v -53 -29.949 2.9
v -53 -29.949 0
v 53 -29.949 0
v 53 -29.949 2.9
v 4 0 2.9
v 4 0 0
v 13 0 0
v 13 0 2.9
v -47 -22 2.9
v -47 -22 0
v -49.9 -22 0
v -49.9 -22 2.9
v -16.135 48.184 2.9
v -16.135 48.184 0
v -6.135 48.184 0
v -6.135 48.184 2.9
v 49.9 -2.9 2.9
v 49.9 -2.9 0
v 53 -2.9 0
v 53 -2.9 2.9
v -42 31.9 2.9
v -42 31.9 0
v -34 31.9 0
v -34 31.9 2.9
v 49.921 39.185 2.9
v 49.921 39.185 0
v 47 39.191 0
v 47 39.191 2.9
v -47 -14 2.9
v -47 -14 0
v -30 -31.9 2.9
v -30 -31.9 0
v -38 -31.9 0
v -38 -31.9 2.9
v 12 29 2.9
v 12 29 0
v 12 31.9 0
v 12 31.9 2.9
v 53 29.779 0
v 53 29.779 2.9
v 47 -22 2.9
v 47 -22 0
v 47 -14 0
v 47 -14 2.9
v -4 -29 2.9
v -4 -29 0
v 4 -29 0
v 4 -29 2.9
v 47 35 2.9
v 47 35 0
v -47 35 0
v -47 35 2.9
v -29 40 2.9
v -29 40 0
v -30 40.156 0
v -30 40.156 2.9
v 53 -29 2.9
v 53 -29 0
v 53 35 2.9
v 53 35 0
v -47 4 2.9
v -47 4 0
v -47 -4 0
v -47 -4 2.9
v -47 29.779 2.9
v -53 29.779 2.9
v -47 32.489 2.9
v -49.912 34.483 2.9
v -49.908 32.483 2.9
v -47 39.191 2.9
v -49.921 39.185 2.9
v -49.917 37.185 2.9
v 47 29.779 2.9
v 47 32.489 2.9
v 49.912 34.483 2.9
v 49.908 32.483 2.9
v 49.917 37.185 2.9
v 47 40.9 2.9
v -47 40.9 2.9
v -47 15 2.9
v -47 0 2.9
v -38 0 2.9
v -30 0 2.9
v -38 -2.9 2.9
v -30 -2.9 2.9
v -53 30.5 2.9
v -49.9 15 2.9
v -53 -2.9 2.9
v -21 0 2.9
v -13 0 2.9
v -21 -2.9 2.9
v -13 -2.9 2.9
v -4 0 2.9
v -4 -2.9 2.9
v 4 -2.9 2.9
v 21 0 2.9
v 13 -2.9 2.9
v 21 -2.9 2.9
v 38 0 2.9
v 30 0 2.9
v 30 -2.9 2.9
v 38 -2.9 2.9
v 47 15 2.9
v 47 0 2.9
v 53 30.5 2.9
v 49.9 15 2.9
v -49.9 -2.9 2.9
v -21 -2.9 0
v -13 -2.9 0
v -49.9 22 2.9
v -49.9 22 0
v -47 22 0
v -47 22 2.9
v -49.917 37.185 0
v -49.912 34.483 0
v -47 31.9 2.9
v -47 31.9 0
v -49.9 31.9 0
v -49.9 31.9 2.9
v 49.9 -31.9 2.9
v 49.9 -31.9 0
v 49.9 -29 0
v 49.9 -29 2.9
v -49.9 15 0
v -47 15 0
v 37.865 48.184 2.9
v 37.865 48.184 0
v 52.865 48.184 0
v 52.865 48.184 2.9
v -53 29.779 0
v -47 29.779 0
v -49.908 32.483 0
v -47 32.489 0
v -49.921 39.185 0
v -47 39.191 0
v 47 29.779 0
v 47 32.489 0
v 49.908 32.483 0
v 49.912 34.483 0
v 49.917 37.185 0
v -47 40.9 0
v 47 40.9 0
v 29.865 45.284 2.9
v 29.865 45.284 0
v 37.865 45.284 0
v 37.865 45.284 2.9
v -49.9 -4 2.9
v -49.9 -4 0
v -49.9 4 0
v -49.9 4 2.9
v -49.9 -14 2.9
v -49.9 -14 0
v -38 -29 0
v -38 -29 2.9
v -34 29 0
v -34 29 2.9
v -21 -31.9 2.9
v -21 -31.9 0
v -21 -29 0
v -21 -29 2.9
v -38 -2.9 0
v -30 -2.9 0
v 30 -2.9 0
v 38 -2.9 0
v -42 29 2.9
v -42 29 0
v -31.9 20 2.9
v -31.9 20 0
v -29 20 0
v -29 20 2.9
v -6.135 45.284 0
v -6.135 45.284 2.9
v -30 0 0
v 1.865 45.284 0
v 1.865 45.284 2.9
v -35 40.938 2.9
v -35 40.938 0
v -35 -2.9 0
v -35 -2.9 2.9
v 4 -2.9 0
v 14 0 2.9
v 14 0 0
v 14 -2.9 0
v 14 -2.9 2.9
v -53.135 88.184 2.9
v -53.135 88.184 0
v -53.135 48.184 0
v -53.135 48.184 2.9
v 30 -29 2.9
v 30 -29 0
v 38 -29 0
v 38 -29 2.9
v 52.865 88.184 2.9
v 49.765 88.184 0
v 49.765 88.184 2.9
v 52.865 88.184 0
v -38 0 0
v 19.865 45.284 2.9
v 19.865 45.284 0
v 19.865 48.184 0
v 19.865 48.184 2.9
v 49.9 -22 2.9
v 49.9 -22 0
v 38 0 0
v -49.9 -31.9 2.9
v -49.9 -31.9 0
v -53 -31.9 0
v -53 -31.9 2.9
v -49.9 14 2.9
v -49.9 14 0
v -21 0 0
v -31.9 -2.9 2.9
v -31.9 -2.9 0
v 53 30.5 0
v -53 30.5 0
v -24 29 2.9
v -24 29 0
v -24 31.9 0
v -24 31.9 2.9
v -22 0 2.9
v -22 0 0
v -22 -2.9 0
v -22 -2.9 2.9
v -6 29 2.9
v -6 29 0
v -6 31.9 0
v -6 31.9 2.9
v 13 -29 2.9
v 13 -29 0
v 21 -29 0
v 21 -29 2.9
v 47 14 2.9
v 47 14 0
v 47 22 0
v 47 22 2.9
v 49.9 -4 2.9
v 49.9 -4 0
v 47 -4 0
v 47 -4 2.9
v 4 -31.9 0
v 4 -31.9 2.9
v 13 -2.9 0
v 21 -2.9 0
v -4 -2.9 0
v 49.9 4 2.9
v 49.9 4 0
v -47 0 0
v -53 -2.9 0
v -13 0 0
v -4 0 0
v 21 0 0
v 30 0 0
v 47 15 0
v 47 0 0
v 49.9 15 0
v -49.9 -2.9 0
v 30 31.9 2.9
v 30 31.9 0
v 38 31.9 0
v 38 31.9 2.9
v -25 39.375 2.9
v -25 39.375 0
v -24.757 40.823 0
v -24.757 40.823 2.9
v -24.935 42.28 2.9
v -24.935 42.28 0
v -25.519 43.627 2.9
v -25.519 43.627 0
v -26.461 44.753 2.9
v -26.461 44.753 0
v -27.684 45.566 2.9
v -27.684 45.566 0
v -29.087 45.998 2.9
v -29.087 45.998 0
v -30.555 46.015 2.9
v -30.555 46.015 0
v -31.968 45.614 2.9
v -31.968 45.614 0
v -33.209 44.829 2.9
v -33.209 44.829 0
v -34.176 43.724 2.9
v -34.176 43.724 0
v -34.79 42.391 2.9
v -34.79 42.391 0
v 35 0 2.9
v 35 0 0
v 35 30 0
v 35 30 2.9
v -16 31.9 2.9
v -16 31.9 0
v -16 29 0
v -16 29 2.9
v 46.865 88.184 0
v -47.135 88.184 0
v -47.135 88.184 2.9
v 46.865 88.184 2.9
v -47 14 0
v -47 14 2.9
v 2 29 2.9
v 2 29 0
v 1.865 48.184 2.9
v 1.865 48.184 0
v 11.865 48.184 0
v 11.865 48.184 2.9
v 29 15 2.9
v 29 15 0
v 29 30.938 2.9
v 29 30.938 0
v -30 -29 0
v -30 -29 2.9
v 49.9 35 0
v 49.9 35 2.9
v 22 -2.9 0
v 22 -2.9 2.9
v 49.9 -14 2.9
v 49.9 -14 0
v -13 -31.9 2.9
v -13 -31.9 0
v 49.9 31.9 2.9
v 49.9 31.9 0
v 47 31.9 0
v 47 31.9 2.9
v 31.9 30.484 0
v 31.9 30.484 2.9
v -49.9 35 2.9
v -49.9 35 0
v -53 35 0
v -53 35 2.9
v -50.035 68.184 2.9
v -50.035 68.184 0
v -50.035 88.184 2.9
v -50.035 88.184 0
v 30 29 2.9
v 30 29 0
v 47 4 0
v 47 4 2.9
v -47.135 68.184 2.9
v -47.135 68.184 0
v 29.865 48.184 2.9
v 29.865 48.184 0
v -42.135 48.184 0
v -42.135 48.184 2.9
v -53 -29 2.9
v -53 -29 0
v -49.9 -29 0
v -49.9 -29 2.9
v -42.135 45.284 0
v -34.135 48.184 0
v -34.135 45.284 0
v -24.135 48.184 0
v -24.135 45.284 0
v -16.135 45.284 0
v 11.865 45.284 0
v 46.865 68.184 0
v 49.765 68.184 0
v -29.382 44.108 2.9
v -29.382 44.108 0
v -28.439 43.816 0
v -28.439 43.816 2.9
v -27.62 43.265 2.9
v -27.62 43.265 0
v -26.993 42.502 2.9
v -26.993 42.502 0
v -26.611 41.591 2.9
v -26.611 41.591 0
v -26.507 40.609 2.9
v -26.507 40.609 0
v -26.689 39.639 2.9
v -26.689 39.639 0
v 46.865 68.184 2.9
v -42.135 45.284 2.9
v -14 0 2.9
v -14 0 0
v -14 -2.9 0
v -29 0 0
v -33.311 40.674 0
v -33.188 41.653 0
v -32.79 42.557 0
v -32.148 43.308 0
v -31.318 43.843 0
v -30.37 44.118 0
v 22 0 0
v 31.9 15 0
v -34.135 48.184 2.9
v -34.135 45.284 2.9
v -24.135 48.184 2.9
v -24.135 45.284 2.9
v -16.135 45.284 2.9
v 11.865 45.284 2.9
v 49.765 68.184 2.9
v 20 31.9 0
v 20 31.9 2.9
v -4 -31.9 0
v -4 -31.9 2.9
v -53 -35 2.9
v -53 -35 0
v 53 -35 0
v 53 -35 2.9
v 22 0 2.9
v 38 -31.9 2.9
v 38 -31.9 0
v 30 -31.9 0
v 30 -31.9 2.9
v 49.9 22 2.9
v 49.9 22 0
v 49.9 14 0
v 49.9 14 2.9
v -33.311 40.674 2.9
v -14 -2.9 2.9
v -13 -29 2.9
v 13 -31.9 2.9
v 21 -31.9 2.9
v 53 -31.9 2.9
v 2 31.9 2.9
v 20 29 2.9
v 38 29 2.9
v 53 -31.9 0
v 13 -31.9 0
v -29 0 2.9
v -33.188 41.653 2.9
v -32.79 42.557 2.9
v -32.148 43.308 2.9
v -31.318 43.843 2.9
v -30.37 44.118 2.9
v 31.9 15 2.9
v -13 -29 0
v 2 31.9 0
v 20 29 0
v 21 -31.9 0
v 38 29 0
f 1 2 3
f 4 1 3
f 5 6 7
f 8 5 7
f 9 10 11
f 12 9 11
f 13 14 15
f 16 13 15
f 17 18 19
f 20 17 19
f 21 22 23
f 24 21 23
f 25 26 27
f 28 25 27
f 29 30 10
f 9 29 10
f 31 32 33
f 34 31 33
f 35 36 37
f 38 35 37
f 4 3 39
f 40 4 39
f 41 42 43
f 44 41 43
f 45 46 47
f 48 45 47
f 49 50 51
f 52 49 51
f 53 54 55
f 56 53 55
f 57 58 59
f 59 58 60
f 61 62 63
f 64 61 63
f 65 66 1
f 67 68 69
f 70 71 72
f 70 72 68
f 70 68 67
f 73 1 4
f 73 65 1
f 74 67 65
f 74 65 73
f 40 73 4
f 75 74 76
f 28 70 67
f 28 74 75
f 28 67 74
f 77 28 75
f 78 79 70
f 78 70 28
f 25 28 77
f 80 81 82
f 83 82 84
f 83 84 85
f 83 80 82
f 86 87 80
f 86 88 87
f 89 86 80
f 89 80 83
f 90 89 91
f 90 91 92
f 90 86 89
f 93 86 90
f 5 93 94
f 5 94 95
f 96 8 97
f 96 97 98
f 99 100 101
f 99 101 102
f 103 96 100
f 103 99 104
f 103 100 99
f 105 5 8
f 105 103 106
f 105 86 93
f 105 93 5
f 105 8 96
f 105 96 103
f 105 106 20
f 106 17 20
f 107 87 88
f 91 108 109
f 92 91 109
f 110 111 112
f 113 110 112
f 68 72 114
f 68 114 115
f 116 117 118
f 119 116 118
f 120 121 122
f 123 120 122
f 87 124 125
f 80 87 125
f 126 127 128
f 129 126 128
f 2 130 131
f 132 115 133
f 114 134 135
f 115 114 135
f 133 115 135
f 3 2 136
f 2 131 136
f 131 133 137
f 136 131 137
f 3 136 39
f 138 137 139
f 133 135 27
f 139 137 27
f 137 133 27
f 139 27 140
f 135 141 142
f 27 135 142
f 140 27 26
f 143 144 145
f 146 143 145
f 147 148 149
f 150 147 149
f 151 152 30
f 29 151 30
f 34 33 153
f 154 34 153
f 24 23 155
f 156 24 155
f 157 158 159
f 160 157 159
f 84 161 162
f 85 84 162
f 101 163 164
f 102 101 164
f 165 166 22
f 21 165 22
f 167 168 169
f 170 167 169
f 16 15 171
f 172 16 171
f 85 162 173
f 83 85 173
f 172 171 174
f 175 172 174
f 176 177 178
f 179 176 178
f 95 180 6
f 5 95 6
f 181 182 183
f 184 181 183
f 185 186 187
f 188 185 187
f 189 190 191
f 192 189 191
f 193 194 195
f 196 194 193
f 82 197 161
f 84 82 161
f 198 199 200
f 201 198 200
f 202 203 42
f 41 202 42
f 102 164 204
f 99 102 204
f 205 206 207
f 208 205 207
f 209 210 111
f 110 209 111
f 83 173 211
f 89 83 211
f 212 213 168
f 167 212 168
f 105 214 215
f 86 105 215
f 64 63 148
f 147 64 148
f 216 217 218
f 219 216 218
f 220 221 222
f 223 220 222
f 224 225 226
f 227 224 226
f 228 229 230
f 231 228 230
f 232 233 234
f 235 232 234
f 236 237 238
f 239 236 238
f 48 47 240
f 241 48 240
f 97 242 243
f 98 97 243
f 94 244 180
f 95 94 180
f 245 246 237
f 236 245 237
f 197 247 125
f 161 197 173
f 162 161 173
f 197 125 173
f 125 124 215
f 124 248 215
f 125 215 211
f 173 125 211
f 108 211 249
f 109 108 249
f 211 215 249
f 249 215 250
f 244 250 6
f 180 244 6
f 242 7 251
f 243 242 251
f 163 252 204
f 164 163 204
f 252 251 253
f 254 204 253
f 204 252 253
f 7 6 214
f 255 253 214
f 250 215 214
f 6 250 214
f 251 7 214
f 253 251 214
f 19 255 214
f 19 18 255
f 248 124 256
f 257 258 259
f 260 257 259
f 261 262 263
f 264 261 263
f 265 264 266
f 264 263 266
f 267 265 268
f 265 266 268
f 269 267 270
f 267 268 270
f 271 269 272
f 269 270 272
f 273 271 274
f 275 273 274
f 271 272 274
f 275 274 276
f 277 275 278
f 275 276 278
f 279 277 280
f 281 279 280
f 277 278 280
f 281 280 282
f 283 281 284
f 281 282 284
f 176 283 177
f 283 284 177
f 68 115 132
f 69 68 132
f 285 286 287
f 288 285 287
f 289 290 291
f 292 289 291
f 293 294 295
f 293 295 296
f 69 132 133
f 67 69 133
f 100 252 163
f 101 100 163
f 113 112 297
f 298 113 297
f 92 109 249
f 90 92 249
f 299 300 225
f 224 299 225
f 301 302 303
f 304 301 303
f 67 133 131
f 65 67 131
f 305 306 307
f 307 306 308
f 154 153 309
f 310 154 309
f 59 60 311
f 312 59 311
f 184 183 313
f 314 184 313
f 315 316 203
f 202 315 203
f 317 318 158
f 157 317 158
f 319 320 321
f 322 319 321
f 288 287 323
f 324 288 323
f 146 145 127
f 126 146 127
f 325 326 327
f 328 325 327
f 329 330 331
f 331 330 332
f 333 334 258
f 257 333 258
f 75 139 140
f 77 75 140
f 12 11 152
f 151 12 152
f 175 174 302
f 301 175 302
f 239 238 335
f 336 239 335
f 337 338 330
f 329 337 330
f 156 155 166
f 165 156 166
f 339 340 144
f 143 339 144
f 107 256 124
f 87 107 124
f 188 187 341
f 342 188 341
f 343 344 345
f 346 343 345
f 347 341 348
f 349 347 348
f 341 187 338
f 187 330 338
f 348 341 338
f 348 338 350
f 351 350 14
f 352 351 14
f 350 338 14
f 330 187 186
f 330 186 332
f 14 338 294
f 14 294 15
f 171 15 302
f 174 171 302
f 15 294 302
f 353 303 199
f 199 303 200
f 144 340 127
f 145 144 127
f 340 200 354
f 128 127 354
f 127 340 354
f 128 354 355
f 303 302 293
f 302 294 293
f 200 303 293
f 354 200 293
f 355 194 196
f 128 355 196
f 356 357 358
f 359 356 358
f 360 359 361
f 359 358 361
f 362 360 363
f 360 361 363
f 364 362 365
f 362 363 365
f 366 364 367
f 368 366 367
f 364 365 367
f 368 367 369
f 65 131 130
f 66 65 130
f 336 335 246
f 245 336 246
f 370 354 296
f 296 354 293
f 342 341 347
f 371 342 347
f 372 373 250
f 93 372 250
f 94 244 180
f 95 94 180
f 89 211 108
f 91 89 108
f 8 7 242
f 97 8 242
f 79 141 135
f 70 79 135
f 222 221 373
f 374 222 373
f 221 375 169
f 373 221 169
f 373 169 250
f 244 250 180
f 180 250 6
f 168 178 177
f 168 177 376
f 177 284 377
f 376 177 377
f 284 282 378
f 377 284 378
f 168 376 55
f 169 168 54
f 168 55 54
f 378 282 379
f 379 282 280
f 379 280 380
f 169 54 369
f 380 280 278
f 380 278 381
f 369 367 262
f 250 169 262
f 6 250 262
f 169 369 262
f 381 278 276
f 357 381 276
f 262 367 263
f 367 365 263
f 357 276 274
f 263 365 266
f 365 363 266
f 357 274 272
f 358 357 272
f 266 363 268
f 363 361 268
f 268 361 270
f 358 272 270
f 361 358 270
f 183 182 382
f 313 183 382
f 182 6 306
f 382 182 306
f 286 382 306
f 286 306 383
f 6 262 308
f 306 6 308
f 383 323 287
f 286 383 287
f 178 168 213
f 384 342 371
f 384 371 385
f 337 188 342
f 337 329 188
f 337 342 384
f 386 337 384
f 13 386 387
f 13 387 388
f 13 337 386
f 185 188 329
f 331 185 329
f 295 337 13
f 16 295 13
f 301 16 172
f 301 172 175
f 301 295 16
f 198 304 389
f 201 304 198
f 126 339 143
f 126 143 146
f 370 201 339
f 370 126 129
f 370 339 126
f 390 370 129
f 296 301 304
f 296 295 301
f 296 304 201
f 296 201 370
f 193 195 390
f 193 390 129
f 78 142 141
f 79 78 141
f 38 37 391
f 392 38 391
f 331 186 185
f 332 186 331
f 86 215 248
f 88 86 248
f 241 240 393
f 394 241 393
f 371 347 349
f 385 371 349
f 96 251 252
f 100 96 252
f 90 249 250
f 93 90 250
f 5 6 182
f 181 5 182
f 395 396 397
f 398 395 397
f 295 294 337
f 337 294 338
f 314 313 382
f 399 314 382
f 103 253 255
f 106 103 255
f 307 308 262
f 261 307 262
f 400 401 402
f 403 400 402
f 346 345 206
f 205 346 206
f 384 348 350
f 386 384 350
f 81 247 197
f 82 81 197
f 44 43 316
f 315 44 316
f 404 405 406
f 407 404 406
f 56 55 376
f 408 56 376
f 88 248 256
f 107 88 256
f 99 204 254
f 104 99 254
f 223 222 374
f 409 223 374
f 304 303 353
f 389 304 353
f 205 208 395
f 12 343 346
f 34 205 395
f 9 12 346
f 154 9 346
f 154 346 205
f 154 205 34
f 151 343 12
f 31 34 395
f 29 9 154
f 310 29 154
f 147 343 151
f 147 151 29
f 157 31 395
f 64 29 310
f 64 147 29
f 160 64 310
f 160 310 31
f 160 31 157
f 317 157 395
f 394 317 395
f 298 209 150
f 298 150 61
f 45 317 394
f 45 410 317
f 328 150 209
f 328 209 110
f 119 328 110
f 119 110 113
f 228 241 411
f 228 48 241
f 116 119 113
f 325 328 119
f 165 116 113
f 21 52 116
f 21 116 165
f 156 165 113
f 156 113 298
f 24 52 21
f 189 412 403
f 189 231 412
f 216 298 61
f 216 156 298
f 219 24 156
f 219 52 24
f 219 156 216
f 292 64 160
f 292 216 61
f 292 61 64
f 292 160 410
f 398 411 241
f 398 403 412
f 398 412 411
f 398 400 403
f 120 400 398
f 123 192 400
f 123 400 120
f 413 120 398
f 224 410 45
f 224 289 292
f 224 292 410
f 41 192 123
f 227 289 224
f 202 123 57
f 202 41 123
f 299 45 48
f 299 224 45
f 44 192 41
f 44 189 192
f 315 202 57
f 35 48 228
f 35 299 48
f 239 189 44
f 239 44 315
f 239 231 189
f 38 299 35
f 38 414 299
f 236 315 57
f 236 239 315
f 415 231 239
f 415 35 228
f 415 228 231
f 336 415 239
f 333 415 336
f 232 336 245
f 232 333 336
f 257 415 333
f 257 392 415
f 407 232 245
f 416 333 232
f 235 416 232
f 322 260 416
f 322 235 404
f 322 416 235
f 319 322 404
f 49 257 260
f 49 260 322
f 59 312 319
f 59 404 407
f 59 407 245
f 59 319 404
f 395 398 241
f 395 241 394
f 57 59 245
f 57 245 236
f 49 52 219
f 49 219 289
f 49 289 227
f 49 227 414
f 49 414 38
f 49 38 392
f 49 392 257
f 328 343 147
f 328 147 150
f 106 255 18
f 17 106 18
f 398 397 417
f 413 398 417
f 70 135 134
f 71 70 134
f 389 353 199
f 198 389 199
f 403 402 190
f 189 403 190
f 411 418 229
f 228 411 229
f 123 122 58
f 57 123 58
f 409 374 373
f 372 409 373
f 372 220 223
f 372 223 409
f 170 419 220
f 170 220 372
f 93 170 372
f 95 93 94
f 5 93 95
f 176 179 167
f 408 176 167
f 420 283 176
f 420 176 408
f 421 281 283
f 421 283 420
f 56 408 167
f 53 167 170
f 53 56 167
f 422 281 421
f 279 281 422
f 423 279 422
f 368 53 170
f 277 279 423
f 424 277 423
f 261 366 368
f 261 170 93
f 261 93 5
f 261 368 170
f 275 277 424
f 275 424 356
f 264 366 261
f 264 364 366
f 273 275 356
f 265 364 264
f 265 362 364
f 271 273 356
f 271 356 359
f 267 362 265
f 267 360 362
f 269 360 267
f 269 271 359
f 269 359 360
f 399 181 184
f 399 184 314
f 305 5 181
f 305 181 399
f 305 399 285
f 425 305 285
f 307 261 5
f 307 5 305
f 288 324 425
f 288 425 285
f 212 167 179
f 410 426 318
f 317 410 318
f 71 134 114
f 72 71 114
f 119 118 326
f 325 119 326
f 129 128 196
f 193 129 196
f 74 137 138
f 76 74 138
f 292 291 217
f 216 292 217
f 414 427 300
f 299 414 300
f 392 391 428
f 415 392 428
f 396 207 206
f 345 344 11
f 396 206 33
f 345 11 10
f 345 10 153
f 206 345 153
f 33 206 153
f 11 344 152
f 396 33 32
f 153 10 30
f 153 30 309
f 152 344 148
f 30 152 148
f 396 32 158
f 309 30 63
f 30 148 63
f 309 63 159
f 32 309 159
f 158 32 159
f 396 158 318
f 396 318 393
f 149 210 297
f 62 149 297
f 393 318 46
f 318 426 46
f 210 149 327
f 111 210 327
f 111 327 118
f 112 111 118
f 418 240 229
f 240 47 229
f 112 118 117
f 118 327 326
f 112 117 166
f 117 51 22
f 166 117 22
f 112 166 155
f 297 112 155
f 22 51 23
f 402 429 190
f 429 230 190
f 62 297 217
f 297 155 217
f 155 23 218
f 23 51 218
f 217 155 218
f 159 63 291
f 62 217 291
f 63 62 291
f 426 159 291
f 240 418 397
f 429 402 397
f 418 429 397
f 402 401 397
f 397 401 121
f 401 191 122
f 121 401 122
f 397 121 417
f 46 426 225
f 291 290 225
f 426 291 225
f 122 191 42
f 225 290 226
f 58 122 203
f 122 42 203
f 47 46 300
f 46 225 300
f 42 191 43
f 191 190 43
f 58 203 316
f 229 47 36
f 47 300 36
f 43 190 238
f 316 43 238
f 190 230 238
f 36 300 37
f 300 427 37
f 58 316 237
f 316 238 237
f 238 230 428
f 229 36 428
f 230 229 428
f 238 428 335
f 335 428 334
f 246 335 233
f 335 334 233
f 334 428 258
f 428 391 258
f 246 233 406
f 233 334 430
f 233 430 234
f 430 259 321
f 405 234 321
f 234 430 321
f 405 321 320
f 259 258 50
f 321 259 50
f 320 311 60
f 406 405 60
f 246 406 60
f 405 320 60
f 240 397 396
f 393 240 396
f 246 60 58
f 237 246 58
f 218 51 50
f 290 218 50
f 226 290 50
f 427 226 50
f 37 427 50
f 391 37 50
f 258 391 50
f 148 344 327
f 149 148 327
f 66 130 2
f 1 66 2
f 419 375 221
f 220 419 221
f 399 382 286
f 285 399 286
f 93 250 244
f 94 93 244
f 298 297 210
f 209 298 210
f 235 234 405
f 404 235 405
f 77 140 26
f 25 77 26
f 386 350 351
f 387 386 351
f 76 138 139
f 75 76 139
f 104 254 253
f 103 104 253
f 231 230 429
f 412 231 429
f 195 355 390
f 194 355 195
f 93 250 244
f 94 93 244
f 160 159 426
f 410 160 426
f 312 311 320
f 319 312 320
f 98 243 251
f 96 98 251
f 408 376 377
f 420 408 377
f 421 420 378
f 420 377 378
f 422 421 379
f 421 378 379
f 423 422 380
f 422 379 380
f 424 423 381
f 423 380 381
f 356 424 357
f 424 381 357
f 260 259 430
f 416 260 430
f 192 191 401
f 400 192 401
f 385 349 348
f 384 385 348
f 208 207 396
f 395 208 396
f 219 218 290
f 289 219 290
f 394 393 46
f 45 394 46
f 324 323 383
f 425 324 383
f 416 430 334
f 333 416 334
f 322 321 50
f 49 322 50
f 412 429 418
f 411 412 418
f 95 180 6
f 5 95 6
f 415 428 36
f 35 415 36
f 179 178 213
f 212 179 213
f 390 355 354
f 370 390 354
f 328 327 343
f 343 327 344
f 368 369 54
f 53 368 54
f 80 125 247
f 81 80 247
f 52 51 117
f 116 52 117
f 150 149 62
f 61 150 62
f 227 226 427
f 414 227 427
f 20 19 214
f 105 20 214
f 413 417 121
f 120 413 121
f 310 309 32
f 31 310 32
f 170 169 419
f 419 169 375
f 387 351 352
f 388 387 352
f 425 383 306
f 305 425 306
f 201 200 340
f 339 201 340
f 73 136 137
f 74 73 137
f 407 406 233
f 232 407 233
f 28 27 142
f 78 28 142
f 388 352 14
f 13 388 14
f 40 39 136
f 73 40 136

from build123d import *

# Parameters (mm, degrees)
F2_DEPTH  = 2.9
F3_W      = 94
F3_H      = 16
F3_H_2    = 4
F3_W_2    = 3.1
F3_H_3    = 20
F4_DEPTH  = 2.9
F6_DEPTH  = 2.9
F8_DEPTH  = 2.9
F9_W      = 94
F9_H      = 1
F10_DEPTH = 2.9


# Not quite as in the source:
# - ends of sketch curves that miss each other by under 0.0002 mm in the source are joined


with BuildPart() as f2:
    # F1 (on Top) → F2 (new body)
    with BuildSketch(Plane.XY):
        Polygon((-53, -31.9), (-53, -35), (53, -35), (53, -31.9), (49.9, -31.9), (49.9, -29), (53, -29), (53, 35), (49.9, 35), (49.9, 31.9), (47, 31.9), (47, 35), (-47, 35), (-47, 31.9), (-49.9, 31.9), (-49.9, 35), (-53, 35), (-53, -29), (-49.9, -29), (-49.9, -31.9), align=None)
        Polygon((38, 29), (47, 29), (47, 22), (49.9, 22), (49.9, 14), (47, 14), (47, 4), (49.9, 4), (49.9, -4), (47, -4), (47, -14), (49.9, -14), (49.9, -22), (47, -22), (47, -29), (38, -29), (38, -31.9), (30, -31.9), (30, -29), (21, -29), (21, -31.9), (13, -31.9), (13, -29), (4, -29), (4, -31.9), (-4, -31.9), (-4, -29), (-13, -29), (-13, -31.9), (-21, -31.9), (-21, -29), (-30, -29), (-30, -31.9), (-38, -31.9), (-38, -29), (-47, -29), (-47, -22), (-49.9, -22), (-49.9, -14), (-47, -14), (-47, -4), (-49.9, -4), (-49.9, 4), (-47, 4), (-47, 14), (-49.9, 14), (-49.9, 22), (-47, 22), (-47, 29), (-42, 29), (-42, 31.9), (-34, 31.9), (-34, 29), (-24, 29), (-24, 31.9), (-16, 31.9), (-16, 29), (-6, 29), (-6, 31.9), (2, 31.9), (2, 29), (12, 29), (12, 31.9), (20, 31.9), (20, 29), (30, 29), (30, 31.9), (38, 31.9), align=None, mode=Mode.SUBTRACT)
        Polygon((47, -29), (0, 0), (-47, -29), (-38, -29), (-30, -29), (-21, -29), (-13, -29), (-4, -29), (4, -29), (13, -29), (21, -29), (30, -29), (38, -29), align=None)
        Polygon((-47, -29), (0, 0), (-47, 29), (-47, 22), (-47, 14), (-47, 4), (-47, -4), (-47, -14), (-47, -22), align=None)
        Polygon((0, 0), (47, 29), (38, 29), (30, 29), (20, 29), (12, 29), (2, 29), (-6, 29), (-16, 29), (-24, 29), (-34, 29), (-42, 29), (-47, 29), align=None)
        Polygon((47, 22), (47, 29), (0, 0), (47, -29), (47, -22), (47, -14), (47, -4), (47, 4), (47, 14), align=None)
    extrude(amount=F2_DEPTH)


with BuildPart() as f4:
    # F3 (on Top) → F4 (new body)
    with BuildSketch(Plane.XY):
        with Locations((-0.1350676175, 76.1836106628)):
            Rectangle(F3_W, F3_H)
        with Locations((-0.1350676175, 86.1836106628)):
            Rectangle(F3_W, F3_H_2)
        with Locations((-51.5850676175, 78.1836106628)):
            Rectangle(F3_W_2, F3_H_3)
        Polygon((37.8649323825, 48.1836106628), (52.8649323825, 48.1836106628), (52.8649323825, 68.1836106628), (49.7649323825, 68.1836106628), (46.8649323825, 68.1836106628), (-47.1350676175, 68.1836106628), (-50.0350676175, 68.1836106628), (-53.1350676175, 68.1836106628), (-53.1350676175, 48.1836106628), (-42.1350676175, 48.1836106628), (-42.1350676175, 45.2836106628), (-34.1350676175, 45.2836106628), (-34.1350676175, 48.1836106628), (-24.1350676175, 48.1836106628), (-24.1350676175, 45.2836106628), (-16.1350676175, 45.2836106628), (-16.1350676175, 48.1836106628), (-6.1350676175, 48.1836106628), (-6.1350676175, 45.2836106628), (1.8649323825, 45.2836106628), (1.8649323825, 48.1836106628), (11.8649323825, 48.1836106628), (11.8649323825, 45.2836106628), (19.8649323825, 45.2836106628), (19.8649323825, 48.1836106628), (29.8649323825, 48.1836106628), (29.8649323825, 45.2836106628), (37.8649323825, 45.2836106628), align=None)
        with Locations((51.3149323825, 78.1836106628)):
            Rectangle(F3_W_2, F3_H_3)
    extrude(amount=F4_DEPTH)


with BuildPart() as f6:
    # F5 (on Top) → F6 (new body)
    with BuildSketch(Plane.XY):
        Polygon((-29, 20), (-29, 15), (29, 15), (29, 30.9375), (-25.0000005956, 39.3750000931), (-26.689130988, 39.6389267169), (-29, 40), (-30, 40.15625), (-33.3108692899, 40.6735733265), (-35, 40.9375), (-35, -2.9), (-31.9, -2.9), (-31.9, 20), align=None)
        Polygon((-29, 0), (-22, 0), (-22, -2.9), (-14, -2.9), (-14, 0), (-4, 0), (-4, -2.9), (4, -2.9), (4, 0), (14, 0), (14, -2.9), (22, -2.9), (22, 0), (35, 0), (35, 15), (31.9, 15), (29, 15), (-29, 15), align=None)
        Polygon((31.9, 30.484375), (31.9, 15), (35, 15), (35, 30), align=None)
        with BuildLine():
            Line((-26.689130988, 39.6389267169), (-25.0000005956, 39.3750000931))
            ThreePointArc((-25.0000005956, 39.3750000931), (-29.0872008599, 45.9981668051), (-35, 40.9375))
            Line((-35, 40.9375), (-33.3108692899, 40.6735733265))
            ThreePointArc((-33.3108692899, 40.6735733265), (-32.1483227603, 43.3077928719), (-29.3824919046, 44.1082986104))
            ThreePointArc((-29.3824919046, 44.1082986104), (-26.9926904447, 42.5022249342), (-26.689130988, 39.6389267169))
        make_face()
    extrude(amount=F6_DEPTH)


with BuildPart() as f8:
    # F7 (on Top) → F8 (new body)
    with BuildSketch(Plane.XY):
        with BuildLine():
            Line((-47, 0), (-38, 0))
            Line((-38, 0), (-38, -2.9))
            Line((-38, -2.9), (-30, -2.9))
            Line((-30, -2.9), (-30, 0))
            Line((-30, 0), (-21, 0))
            Line((-21, 0), (-21, -2.9))
            Line((-21, -2.9), (-13, -2.9))
            Line((-13, -2.9), (-13, 0))
            Line((-13, 0), (-4, 0))
            Line((-4, 0), (-4, -2.9))
            Line((-4, -2.9), (4, -2.9))
            Line((4, -2.9), (4, 0))
            Line((4, 0), (13, 0))
            Line((13, 0), (13, -2.9))
            Line((13, -2.9), (21, -2.9))
            Line((21, -2.9), (21, 0))
            Line((21, 0), (30, 0))
            Line((30, 0), (30, -2.9))
            Line((30, -2.9), (38, -2.9))
            Line((38, -2.9), (38, 0))
            Line((38, 0), (47, 0))
            Line((47, 0), (47, 15))
            Line((47, 15), (49.9, 15))
            Line((49.9, 15), (49.9, -2.9))
            Line((49.9, -2.9), (53, -2.9))
            Line((53, -2.9), (53, 30.5))
            Line((53, 30.5), (9, 30.5))
            Line((9, 30.5), (9, 11))
            ThreePointArc((9, 11), (7.8284271247, 8.1715728753), (5, 7))
            Line((5, 7), (0, 7))
            Line((0, 7), (-5, 7))
            ThreePointArc((-5, 7), (-7.8284271247, 8.1715728753), (-9, 11))
            Line((-9, 11), (-9, 30.5))
            Line((-9, 30.5), (-53, 30.5))
            Line((-53, 30.5), (-53, -2.9))
            Line((-53, -2.9), (-49.9, -2.9))
            Line((-49.9, -2.9), (-49.9, 15))
            Line((-49.9, 15), (-47, 15))
            Line((-47, 15), (-47, 0))
        make_face()
        with BuildLine():
            Line((0, 30.5), (-9, 30.5))
            Line((-9, 30.5), (-9, 11))
            ThreePointArc((-9, 11), (-7.8284271247, 8.1715728753), (-5, 7))
            Line((-5, 7), (0, 7))
            Line((0, 7), (0, 30.5))
        make_face()
        with BuildLine():
            Line((9, 30.5), (0, 30.5))
            Line((0, 30.5), (0, 7))
            Line((0, 7), (5, 7))
            ThreePointArc((5, 7), (7.8284271247, 8.1715728753), (9, 11))
            Line((9, 11), (9, 30.5))
        make_face()
    extrude(amount=F8_DEPTH)


with BuildPart() as f10:
    # F9 (on Top) → F10 (new body)
    with BuildSketch(Plane.XY):
        Polygon((49.917257, 37.184827), (47, 37.190595), (47, 34.48852), (49.911914, 34.482763), align=None)
        Polygon((-47, 37.190595), (-47, 39.190599), (-49.921211, 39.184823), (-49.9172566996, 37.1848270006), align=None)
        Polygon((47, 39.190599), (47, 40.900225), (-47, 40.900225), (-47, 39.190599), (-47, 37.190595), (-47, 34.48852), (-47, 32.488516), (-47, 30.778891), (47, 30.778891), (47, 32.488516), (47, 34.48852), (47, 37.190595), align=None)
        Polygon((53, 29.778891), (47, 29.778891), (-47, 29.778891), (-53, 29.778891), (-53, -29.949115), (53, -29.949115), align=None)
        with Locations((0, 30.278891)):
            Rectangle(F9_W, F9_H)
        Polygon((-47, 34.48852), (-47, 37.190595), (-49.917257, 37.184827), (-49.9119143024, 34.4827629994), align=None)
        Polygon((49.921211, 39.184823), (47, 39.190599), (47, 37.190595), (49.917257, 37.184827), align=None)
        Polygon((-47, 32.488516), (-47, 34.48852), (-49.911914, 34.482763), (-49.90796, 32.482766), align=None)
        Polygon((49.911914, 34.482763), (47, 34.48852), (47, 32.488516), (49.90796, 32.482766), align=None)
    extrude(amount=F10_DEPTH)


solid = Compound([f2.part, f4.part, f6.part, f8.part, f10.part])
